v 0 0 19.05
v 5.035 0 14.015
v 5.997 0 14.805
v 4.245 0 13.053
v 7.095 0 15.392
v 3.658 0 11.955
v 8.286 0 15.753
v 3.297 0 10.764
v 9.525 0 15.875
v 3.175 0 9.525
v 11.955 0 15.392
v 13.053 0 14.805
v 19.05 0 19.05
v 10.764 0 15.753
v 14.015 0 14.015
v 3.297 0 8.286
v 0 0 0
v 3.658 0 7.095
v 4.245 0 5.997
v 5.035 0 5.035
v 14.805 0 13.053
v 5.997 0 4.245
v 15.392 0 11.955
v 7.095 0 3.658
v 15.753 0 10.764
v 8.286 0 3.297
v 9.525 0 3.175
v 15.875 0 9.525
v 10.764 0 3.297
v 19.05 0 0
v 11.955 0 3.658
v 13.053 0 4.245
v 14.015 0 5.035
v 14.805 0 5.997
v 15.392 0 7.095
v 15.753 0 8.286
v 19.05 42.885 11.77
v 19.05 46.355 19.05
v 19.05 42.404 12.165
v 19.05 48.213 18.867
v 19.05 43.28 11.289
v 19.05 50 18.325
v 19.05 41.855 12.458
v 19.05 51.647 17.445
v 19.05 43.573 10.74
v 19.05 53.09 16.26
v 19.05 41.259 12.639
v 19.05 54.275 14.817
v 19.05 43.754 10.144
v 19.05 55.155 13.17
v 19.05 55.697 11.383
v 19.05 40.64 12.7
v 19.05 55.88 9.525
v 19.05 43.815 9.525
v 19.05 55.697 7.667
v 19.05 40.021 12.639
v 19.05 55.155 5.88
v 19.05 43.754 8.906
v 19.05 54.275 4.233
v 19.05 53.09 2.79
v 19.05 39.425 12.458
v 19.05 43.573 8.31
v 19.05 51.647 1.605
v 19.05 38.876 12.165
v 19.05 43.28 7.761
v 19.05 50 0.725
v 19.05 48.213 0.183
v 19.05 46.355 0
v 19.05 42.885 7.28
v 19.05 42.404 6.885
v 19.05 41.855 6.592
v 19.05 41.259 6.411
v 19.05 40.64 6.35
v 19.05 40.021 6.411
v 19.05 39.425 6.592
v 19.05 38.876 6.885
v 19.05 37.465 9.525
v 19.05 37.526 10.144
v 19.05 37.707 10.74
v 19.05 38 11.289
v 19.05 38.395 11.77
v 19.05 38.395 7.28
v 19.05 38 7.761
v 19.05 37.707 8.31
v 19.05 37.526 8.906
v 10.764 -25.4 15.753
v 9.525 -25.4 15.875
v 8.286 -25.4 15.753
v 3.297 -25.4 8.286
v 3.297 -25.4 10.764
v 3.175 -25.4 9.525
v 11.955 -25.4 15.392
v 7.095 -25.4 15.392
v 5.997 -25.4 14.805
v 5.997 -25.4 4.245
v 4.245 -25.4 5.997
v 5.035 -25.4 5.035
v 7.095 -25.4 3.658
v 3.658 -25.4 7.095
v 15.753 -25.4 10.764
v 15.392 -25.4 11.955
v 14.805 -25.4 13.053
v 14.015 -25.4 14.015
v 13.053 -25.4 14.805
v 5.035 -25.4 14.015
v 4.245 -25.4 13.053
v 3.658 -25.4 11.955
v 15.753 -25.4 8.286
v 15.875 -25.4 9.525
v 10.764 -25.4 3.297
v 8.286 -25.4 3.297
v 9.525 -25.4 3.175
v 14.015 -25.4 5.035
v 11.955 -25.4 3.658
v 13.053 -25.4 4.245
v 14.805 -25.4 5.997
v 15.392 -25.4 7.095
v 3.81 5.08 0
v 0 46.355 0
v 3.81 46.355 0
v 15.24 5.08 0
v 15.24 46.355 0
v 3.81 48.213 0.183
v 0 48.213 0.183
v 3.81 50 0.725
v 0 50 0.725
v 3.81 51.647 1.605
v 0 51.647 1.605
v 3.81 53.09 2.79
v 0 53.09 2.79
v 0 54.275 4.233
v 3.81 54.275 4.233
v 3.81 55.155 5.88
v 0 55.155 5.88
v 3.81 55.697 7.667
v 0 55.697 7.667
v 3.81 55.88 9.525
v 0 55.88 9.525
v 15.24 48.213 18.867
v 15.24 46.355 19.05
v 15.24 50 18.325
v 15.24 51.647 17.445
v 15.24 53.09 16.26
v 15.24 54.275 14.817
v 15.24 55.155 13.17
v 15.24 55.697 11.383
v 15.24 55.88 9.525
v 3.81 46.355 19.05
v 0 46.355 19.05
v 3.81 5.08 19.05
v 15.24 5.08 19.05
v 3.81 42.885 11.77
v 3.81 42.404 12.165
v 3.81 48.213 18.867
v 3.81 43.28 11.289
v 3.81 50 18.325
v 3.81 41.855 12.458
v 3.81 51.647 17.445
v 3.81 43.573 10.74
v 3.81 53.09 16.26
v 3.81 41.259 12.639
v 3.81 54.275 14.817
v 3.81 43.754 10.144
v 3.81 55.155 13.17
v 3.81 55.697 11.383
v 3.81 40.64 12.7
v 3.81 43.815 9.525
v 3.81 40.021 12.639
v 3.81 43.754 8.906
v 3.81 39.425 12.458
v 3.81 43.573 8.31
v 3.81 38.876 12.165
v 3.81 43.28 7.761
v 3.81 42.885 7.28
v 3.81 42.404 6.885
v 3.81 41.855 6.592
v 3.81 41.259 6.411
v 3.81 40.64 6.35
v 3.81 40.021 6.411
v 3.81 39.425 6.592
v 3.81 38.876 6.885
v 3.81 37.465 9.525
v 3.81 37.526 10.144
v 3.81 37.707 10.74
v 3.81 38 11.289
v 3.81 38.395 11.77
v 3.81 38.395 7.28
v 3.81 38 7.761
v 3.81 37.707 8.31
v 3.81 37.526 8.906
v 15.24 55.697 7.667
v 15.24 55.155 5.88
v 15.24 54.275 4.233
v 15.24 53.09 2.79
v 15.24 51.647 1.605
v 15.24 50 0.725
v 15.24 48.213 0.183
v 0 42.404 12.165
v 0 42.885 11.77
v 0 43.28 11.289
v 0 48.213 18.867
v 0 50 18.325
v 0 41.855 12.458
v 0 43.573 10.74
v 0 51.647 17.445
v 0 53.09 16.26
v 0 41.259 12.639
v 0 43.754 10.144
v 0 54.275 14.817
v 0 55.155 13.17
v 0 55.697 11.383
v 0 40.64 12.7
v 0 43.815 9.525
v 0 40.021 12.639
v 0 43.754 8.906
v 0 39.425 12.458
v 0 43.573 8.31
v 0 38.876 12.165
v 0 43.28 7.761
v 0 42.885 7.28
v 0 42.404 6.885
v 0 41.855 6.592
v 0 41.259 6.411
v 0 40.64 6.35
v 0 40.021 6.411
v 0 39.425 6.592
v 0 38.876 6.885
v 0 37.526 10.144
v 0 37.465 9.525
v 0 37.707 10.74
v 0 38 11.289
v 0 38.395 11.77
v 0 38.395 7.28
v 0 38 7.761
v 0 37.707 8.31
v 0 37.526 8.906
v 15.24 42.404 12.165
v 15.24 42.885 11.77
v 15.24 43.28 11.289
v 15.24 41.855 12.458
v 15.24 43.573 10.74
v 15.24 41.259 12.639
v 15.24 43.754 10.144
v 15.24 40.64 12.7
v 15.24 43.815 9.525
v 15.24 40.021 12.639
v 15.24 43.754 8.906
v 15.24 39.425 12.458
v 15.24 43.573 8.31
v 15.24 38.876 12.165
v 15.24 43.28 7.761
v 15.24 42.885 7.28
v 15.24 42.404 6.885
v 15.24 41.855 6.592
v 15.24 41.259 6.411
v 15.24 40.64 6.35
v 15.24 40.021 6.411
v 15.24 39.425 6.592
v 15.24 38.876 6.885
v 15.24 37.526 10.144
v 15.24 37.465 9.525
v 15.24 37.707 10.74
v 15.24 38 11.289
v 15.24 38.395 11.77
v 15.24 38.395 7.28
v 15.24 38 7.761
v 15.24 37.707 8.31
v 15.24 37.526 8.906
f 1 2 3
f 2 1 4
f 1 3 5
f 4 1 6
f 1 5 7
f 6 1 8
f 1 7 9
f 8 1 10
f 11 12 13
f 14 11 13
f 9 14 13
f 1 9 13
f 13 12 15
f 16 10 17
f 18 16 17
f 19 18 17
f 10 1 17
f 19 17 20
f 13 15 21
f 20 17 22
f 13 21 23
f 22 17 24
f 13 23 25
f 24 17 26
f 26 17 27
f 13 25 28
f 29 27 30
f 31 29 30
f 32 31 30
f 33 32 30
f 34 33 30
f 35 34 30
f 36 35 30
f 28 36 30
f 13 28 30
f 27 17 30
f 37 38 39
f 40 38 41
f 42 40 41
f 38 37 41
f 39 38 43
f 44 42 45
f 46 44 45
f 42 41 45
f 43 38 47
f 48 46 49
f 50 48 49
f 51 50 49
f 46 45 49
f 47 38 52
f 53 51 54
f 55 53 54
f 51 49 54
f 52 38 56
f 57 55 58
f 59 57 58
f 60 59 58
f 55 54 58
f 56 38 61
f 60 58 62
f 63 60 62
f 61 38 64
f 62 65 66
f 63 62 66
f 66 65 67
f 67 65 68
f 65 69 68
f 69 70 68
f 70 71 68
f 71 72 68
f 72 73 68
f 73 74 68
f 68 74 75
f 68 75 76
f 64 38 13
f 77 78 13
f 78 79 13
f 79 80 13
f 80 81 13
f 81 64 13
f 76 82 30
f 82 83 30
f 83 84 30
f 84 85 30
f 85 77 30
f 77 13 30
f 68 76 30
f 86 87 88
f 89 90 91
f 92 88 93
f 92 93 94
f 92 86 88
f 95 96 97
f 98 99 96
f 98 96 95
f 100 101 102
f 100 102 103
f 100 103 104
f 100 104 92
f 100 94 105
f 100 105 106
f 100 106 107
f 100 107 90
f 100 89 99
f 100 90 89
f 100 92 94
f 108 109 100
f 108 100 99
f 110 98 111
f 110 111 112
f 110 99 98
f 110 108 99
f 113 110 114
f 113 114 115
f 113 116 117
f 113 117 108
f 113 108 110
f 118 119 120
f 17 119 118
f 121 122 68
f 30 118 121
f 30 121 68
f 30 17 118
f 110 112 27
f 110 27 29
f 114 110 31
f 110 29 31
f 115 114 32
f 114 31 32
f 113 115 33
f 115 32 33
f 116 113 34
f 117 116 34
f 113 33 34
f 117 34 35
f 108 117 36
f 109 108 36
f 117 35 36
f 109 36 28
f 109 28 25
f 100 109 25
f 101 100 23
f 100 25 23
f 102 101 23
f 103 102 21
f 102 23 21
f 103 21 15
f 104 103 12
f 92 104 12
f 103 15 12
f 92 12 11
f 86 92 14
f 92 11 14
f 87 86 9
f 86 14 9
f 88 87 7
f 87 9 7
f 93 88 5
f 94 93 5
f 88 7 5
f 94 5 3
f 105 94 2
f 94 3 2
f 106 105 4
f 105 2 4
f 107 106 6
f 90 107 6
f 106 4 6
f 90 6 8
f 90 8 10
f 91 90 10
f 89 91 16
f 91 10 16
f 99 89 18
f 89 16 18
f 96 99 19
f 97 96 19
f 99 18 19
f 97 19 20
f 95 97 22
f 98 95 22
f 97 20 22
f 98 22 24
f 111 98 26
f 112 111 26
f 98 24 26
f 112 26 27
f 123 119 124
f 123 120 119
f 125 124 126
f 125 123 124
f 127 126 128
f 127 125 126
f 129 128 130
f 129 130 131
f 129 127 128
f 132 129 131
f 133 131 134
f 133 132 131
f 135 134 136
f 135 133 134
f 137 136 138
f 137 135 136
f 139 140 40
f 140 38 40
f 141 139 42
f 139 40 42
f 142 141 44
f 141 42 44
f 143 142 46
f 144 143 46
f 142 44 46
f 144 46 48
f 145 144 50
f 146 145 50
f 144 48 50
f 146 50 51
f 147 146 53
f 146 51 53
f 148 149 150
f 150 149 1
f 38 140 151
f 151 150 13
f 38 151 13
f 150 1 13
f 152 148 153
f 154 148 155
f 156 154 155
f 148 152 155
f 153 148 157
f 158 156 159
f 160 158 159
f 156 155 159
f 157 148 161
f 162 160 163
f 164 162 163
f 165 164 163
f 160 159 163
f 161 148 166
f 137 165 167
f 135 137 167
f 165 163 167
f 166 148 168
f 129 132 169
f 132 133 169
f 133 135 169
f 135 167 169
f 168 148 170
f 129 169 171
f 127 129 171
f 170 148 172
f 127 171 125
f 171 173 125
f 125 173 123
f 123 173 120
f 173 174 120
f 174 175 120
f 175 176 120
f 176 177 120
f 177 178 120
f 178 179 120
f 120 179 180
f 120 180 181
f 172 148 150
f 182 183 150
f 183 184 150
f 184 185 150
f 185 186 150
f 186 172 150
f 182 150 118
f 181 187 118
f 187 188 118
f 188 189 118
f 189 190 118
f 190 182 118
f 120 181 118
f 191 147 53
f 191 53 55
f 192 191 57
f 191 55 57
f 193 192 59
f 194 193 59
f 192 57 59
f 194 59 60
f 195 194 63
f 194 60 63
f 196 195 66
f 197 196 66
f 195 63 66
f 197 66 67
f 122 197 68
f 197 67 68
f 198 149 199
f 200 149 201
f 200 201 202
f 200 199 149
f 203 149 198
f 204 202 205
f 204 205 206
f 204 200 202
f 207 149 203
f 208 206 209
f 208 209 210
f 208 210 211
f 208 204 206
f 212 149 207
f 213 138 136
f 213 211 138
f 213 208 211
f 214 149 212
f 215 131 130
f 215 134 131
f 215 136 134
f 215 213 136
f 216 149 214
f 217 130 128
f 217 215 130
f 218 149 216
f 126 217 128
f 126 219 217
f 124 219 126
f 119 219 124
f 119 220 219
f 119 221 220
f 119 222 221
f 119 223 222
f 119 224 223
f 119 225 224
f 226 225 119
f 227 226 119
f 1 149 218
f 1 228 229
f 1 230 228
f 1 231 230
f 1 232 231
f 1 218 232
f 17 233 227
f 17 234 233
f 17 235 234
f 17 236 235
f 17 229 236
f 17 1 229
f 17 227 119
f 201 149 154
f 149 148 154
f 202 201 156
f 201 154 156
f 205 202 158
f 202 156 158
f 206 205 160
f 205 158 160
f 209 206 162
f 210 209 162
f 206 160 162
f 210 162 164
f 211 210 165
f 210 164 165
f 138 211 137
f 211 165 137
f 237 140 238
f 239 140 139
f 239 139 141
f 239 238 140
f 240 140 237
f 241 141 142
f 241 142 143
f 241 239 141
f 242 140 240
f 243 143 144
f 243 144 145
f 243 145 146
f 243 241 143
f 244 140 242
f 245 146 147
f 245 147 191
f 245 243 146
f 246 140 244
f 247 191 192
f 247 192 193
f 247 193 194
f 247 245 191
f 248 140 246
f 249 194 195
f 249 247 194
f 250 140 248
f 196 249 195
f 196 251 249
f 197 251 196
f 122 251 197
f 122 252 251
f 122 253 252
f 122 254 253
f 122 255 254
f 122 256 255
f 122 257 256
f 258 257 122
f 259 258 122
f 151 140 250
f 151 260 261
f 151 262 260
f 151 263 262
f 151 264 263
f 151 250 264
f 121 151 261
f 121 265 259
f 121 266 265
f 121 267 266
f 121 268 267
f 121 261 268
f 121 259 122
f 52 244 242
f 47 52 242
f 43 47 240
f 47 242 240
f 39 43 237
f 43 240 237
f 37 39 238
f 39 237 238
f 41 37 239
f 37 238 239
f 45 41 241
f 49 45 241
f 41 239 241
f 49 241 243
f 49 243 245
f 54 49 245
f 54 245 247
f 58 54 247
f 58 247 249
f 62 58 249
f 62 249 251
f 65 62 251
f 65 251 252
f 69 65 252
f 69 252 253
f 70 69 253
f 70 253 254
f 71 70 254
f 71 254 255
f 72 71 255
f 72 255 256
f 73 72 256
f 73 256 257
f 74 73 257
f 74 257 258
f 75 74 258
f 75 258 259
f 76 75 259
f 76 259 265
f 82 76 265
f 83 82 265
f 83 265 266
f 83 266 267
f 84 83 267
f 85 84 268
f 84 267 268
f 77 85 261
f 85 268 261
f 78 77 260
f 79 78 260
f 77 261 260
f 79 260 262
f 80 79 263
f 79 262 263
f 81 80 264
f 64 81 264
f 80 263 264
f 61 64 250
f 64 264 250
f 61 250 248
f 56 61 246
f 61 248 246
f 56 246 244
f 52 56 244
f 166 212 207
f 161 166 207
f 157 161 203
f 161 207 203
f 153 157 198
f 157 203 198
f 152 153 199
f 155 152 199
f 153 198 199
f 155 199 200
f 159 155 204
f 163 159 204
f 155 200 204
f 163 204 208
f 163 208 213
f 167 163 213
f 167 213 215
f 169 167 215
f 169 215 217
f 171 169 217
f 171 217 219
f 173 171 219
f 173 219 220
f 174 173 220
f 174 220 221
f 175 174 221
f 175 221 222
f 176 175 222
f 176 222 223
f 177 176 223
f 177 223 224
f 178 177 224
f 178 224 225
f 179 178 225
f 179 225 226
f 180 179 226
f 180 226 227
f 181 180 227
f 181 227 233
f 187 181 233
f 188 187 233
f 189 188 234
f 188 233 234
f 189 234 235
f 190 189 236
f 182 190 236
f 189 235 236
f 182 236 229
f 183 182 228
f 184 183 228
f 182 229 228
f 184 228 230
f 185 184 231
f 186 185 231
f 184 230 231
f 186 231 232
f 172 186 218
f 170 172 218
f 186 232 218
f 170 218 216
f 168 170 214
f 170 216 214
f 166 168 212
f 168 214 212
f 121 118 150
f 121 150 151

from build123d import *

# Parameters (mm, degrees)
SKETCH1_W           = 19.05
SKETCH1_H           = 19.05
BOSS_EXTRUDE1_DEPTH = 5.08
SKETCH2_W           = 3.81
SKETCH2_H           = 19.05
BOSS_EXTRUDE2_DEPTH = 50.8
FILLET1_R           = 9.525
SKETCH3_R           = 3.175
CUT_EXTRUDE1_DEPTH  = 63.035307688
SKETCH4_R           = 6.35
BOSS_EXTRUDE3_DEPTH = 25.4


with BuildPart() as part:
    # Sketch1 → Boss-Extrude1 (new body)
    with BuildSketch(Plane(origin=(0, 0, 0), x_dir=(1, 0, 0), z_dir=(0, 1, 0))):
        with Locations((9.525, -9.525)):
            Rectangle(SKETCH1_W, SKETCH1_H)
    extrude(amount=BOSS_EXTRUDE1_DEPTH)

    # Sketch2 → Boss-Extrude2 (add)
    with BuildSketch(Plane(origin=(0, 5.08, 0), x_dir=(1, 0, 0), z_dir=(0, 1, 0))):
        with Locations((1.905, -9.525)):
            Rectangle(SKETCH2_W, SKETCH2_H)
        with Locations((17.145, -9.525)):
            Rectangle(SKETCH2_W, SKETCH2_H)
    extrude(amount=BOSS_EXTRUDE2_DEPTH)

    # Fillet1
    fillet1_edges = [part.edges().sort_by_distance(p)[0] for p in [
        (1.905, 55.88, 0),
        (17.145, 55.88, 0),
        (1.905, 55.88, 19.05),
        (17.145, 55.88, 19.05),
    ]]
    fillet(fillet1_edges, radius=FILLET1_R - 0.0001)  # a hair under: the kernel refuses the full size

    # Sketch3 → Cut-Extrude1 (cut, through all)
    with BuildSketch(Plane.ZY):
        with Locations((9.525, 40.64)):
            Circle(SKETCH3_R)
    extrude(amount=-CUT_EXTRUDE1_DEPTH, mode=Mode.SUBTRACT)

    # Sketch4 → Boss-Extrude3 (add)
    with BuildSketch(Plane.XZ):
        with Locations(Location((9.525, 9.525, 0), (0, 0, 270))):
            Circle(SKETCH4_R)
    extrude(amount=BOSS_EXTRUDE3_DEPTH)


solid = part.part
